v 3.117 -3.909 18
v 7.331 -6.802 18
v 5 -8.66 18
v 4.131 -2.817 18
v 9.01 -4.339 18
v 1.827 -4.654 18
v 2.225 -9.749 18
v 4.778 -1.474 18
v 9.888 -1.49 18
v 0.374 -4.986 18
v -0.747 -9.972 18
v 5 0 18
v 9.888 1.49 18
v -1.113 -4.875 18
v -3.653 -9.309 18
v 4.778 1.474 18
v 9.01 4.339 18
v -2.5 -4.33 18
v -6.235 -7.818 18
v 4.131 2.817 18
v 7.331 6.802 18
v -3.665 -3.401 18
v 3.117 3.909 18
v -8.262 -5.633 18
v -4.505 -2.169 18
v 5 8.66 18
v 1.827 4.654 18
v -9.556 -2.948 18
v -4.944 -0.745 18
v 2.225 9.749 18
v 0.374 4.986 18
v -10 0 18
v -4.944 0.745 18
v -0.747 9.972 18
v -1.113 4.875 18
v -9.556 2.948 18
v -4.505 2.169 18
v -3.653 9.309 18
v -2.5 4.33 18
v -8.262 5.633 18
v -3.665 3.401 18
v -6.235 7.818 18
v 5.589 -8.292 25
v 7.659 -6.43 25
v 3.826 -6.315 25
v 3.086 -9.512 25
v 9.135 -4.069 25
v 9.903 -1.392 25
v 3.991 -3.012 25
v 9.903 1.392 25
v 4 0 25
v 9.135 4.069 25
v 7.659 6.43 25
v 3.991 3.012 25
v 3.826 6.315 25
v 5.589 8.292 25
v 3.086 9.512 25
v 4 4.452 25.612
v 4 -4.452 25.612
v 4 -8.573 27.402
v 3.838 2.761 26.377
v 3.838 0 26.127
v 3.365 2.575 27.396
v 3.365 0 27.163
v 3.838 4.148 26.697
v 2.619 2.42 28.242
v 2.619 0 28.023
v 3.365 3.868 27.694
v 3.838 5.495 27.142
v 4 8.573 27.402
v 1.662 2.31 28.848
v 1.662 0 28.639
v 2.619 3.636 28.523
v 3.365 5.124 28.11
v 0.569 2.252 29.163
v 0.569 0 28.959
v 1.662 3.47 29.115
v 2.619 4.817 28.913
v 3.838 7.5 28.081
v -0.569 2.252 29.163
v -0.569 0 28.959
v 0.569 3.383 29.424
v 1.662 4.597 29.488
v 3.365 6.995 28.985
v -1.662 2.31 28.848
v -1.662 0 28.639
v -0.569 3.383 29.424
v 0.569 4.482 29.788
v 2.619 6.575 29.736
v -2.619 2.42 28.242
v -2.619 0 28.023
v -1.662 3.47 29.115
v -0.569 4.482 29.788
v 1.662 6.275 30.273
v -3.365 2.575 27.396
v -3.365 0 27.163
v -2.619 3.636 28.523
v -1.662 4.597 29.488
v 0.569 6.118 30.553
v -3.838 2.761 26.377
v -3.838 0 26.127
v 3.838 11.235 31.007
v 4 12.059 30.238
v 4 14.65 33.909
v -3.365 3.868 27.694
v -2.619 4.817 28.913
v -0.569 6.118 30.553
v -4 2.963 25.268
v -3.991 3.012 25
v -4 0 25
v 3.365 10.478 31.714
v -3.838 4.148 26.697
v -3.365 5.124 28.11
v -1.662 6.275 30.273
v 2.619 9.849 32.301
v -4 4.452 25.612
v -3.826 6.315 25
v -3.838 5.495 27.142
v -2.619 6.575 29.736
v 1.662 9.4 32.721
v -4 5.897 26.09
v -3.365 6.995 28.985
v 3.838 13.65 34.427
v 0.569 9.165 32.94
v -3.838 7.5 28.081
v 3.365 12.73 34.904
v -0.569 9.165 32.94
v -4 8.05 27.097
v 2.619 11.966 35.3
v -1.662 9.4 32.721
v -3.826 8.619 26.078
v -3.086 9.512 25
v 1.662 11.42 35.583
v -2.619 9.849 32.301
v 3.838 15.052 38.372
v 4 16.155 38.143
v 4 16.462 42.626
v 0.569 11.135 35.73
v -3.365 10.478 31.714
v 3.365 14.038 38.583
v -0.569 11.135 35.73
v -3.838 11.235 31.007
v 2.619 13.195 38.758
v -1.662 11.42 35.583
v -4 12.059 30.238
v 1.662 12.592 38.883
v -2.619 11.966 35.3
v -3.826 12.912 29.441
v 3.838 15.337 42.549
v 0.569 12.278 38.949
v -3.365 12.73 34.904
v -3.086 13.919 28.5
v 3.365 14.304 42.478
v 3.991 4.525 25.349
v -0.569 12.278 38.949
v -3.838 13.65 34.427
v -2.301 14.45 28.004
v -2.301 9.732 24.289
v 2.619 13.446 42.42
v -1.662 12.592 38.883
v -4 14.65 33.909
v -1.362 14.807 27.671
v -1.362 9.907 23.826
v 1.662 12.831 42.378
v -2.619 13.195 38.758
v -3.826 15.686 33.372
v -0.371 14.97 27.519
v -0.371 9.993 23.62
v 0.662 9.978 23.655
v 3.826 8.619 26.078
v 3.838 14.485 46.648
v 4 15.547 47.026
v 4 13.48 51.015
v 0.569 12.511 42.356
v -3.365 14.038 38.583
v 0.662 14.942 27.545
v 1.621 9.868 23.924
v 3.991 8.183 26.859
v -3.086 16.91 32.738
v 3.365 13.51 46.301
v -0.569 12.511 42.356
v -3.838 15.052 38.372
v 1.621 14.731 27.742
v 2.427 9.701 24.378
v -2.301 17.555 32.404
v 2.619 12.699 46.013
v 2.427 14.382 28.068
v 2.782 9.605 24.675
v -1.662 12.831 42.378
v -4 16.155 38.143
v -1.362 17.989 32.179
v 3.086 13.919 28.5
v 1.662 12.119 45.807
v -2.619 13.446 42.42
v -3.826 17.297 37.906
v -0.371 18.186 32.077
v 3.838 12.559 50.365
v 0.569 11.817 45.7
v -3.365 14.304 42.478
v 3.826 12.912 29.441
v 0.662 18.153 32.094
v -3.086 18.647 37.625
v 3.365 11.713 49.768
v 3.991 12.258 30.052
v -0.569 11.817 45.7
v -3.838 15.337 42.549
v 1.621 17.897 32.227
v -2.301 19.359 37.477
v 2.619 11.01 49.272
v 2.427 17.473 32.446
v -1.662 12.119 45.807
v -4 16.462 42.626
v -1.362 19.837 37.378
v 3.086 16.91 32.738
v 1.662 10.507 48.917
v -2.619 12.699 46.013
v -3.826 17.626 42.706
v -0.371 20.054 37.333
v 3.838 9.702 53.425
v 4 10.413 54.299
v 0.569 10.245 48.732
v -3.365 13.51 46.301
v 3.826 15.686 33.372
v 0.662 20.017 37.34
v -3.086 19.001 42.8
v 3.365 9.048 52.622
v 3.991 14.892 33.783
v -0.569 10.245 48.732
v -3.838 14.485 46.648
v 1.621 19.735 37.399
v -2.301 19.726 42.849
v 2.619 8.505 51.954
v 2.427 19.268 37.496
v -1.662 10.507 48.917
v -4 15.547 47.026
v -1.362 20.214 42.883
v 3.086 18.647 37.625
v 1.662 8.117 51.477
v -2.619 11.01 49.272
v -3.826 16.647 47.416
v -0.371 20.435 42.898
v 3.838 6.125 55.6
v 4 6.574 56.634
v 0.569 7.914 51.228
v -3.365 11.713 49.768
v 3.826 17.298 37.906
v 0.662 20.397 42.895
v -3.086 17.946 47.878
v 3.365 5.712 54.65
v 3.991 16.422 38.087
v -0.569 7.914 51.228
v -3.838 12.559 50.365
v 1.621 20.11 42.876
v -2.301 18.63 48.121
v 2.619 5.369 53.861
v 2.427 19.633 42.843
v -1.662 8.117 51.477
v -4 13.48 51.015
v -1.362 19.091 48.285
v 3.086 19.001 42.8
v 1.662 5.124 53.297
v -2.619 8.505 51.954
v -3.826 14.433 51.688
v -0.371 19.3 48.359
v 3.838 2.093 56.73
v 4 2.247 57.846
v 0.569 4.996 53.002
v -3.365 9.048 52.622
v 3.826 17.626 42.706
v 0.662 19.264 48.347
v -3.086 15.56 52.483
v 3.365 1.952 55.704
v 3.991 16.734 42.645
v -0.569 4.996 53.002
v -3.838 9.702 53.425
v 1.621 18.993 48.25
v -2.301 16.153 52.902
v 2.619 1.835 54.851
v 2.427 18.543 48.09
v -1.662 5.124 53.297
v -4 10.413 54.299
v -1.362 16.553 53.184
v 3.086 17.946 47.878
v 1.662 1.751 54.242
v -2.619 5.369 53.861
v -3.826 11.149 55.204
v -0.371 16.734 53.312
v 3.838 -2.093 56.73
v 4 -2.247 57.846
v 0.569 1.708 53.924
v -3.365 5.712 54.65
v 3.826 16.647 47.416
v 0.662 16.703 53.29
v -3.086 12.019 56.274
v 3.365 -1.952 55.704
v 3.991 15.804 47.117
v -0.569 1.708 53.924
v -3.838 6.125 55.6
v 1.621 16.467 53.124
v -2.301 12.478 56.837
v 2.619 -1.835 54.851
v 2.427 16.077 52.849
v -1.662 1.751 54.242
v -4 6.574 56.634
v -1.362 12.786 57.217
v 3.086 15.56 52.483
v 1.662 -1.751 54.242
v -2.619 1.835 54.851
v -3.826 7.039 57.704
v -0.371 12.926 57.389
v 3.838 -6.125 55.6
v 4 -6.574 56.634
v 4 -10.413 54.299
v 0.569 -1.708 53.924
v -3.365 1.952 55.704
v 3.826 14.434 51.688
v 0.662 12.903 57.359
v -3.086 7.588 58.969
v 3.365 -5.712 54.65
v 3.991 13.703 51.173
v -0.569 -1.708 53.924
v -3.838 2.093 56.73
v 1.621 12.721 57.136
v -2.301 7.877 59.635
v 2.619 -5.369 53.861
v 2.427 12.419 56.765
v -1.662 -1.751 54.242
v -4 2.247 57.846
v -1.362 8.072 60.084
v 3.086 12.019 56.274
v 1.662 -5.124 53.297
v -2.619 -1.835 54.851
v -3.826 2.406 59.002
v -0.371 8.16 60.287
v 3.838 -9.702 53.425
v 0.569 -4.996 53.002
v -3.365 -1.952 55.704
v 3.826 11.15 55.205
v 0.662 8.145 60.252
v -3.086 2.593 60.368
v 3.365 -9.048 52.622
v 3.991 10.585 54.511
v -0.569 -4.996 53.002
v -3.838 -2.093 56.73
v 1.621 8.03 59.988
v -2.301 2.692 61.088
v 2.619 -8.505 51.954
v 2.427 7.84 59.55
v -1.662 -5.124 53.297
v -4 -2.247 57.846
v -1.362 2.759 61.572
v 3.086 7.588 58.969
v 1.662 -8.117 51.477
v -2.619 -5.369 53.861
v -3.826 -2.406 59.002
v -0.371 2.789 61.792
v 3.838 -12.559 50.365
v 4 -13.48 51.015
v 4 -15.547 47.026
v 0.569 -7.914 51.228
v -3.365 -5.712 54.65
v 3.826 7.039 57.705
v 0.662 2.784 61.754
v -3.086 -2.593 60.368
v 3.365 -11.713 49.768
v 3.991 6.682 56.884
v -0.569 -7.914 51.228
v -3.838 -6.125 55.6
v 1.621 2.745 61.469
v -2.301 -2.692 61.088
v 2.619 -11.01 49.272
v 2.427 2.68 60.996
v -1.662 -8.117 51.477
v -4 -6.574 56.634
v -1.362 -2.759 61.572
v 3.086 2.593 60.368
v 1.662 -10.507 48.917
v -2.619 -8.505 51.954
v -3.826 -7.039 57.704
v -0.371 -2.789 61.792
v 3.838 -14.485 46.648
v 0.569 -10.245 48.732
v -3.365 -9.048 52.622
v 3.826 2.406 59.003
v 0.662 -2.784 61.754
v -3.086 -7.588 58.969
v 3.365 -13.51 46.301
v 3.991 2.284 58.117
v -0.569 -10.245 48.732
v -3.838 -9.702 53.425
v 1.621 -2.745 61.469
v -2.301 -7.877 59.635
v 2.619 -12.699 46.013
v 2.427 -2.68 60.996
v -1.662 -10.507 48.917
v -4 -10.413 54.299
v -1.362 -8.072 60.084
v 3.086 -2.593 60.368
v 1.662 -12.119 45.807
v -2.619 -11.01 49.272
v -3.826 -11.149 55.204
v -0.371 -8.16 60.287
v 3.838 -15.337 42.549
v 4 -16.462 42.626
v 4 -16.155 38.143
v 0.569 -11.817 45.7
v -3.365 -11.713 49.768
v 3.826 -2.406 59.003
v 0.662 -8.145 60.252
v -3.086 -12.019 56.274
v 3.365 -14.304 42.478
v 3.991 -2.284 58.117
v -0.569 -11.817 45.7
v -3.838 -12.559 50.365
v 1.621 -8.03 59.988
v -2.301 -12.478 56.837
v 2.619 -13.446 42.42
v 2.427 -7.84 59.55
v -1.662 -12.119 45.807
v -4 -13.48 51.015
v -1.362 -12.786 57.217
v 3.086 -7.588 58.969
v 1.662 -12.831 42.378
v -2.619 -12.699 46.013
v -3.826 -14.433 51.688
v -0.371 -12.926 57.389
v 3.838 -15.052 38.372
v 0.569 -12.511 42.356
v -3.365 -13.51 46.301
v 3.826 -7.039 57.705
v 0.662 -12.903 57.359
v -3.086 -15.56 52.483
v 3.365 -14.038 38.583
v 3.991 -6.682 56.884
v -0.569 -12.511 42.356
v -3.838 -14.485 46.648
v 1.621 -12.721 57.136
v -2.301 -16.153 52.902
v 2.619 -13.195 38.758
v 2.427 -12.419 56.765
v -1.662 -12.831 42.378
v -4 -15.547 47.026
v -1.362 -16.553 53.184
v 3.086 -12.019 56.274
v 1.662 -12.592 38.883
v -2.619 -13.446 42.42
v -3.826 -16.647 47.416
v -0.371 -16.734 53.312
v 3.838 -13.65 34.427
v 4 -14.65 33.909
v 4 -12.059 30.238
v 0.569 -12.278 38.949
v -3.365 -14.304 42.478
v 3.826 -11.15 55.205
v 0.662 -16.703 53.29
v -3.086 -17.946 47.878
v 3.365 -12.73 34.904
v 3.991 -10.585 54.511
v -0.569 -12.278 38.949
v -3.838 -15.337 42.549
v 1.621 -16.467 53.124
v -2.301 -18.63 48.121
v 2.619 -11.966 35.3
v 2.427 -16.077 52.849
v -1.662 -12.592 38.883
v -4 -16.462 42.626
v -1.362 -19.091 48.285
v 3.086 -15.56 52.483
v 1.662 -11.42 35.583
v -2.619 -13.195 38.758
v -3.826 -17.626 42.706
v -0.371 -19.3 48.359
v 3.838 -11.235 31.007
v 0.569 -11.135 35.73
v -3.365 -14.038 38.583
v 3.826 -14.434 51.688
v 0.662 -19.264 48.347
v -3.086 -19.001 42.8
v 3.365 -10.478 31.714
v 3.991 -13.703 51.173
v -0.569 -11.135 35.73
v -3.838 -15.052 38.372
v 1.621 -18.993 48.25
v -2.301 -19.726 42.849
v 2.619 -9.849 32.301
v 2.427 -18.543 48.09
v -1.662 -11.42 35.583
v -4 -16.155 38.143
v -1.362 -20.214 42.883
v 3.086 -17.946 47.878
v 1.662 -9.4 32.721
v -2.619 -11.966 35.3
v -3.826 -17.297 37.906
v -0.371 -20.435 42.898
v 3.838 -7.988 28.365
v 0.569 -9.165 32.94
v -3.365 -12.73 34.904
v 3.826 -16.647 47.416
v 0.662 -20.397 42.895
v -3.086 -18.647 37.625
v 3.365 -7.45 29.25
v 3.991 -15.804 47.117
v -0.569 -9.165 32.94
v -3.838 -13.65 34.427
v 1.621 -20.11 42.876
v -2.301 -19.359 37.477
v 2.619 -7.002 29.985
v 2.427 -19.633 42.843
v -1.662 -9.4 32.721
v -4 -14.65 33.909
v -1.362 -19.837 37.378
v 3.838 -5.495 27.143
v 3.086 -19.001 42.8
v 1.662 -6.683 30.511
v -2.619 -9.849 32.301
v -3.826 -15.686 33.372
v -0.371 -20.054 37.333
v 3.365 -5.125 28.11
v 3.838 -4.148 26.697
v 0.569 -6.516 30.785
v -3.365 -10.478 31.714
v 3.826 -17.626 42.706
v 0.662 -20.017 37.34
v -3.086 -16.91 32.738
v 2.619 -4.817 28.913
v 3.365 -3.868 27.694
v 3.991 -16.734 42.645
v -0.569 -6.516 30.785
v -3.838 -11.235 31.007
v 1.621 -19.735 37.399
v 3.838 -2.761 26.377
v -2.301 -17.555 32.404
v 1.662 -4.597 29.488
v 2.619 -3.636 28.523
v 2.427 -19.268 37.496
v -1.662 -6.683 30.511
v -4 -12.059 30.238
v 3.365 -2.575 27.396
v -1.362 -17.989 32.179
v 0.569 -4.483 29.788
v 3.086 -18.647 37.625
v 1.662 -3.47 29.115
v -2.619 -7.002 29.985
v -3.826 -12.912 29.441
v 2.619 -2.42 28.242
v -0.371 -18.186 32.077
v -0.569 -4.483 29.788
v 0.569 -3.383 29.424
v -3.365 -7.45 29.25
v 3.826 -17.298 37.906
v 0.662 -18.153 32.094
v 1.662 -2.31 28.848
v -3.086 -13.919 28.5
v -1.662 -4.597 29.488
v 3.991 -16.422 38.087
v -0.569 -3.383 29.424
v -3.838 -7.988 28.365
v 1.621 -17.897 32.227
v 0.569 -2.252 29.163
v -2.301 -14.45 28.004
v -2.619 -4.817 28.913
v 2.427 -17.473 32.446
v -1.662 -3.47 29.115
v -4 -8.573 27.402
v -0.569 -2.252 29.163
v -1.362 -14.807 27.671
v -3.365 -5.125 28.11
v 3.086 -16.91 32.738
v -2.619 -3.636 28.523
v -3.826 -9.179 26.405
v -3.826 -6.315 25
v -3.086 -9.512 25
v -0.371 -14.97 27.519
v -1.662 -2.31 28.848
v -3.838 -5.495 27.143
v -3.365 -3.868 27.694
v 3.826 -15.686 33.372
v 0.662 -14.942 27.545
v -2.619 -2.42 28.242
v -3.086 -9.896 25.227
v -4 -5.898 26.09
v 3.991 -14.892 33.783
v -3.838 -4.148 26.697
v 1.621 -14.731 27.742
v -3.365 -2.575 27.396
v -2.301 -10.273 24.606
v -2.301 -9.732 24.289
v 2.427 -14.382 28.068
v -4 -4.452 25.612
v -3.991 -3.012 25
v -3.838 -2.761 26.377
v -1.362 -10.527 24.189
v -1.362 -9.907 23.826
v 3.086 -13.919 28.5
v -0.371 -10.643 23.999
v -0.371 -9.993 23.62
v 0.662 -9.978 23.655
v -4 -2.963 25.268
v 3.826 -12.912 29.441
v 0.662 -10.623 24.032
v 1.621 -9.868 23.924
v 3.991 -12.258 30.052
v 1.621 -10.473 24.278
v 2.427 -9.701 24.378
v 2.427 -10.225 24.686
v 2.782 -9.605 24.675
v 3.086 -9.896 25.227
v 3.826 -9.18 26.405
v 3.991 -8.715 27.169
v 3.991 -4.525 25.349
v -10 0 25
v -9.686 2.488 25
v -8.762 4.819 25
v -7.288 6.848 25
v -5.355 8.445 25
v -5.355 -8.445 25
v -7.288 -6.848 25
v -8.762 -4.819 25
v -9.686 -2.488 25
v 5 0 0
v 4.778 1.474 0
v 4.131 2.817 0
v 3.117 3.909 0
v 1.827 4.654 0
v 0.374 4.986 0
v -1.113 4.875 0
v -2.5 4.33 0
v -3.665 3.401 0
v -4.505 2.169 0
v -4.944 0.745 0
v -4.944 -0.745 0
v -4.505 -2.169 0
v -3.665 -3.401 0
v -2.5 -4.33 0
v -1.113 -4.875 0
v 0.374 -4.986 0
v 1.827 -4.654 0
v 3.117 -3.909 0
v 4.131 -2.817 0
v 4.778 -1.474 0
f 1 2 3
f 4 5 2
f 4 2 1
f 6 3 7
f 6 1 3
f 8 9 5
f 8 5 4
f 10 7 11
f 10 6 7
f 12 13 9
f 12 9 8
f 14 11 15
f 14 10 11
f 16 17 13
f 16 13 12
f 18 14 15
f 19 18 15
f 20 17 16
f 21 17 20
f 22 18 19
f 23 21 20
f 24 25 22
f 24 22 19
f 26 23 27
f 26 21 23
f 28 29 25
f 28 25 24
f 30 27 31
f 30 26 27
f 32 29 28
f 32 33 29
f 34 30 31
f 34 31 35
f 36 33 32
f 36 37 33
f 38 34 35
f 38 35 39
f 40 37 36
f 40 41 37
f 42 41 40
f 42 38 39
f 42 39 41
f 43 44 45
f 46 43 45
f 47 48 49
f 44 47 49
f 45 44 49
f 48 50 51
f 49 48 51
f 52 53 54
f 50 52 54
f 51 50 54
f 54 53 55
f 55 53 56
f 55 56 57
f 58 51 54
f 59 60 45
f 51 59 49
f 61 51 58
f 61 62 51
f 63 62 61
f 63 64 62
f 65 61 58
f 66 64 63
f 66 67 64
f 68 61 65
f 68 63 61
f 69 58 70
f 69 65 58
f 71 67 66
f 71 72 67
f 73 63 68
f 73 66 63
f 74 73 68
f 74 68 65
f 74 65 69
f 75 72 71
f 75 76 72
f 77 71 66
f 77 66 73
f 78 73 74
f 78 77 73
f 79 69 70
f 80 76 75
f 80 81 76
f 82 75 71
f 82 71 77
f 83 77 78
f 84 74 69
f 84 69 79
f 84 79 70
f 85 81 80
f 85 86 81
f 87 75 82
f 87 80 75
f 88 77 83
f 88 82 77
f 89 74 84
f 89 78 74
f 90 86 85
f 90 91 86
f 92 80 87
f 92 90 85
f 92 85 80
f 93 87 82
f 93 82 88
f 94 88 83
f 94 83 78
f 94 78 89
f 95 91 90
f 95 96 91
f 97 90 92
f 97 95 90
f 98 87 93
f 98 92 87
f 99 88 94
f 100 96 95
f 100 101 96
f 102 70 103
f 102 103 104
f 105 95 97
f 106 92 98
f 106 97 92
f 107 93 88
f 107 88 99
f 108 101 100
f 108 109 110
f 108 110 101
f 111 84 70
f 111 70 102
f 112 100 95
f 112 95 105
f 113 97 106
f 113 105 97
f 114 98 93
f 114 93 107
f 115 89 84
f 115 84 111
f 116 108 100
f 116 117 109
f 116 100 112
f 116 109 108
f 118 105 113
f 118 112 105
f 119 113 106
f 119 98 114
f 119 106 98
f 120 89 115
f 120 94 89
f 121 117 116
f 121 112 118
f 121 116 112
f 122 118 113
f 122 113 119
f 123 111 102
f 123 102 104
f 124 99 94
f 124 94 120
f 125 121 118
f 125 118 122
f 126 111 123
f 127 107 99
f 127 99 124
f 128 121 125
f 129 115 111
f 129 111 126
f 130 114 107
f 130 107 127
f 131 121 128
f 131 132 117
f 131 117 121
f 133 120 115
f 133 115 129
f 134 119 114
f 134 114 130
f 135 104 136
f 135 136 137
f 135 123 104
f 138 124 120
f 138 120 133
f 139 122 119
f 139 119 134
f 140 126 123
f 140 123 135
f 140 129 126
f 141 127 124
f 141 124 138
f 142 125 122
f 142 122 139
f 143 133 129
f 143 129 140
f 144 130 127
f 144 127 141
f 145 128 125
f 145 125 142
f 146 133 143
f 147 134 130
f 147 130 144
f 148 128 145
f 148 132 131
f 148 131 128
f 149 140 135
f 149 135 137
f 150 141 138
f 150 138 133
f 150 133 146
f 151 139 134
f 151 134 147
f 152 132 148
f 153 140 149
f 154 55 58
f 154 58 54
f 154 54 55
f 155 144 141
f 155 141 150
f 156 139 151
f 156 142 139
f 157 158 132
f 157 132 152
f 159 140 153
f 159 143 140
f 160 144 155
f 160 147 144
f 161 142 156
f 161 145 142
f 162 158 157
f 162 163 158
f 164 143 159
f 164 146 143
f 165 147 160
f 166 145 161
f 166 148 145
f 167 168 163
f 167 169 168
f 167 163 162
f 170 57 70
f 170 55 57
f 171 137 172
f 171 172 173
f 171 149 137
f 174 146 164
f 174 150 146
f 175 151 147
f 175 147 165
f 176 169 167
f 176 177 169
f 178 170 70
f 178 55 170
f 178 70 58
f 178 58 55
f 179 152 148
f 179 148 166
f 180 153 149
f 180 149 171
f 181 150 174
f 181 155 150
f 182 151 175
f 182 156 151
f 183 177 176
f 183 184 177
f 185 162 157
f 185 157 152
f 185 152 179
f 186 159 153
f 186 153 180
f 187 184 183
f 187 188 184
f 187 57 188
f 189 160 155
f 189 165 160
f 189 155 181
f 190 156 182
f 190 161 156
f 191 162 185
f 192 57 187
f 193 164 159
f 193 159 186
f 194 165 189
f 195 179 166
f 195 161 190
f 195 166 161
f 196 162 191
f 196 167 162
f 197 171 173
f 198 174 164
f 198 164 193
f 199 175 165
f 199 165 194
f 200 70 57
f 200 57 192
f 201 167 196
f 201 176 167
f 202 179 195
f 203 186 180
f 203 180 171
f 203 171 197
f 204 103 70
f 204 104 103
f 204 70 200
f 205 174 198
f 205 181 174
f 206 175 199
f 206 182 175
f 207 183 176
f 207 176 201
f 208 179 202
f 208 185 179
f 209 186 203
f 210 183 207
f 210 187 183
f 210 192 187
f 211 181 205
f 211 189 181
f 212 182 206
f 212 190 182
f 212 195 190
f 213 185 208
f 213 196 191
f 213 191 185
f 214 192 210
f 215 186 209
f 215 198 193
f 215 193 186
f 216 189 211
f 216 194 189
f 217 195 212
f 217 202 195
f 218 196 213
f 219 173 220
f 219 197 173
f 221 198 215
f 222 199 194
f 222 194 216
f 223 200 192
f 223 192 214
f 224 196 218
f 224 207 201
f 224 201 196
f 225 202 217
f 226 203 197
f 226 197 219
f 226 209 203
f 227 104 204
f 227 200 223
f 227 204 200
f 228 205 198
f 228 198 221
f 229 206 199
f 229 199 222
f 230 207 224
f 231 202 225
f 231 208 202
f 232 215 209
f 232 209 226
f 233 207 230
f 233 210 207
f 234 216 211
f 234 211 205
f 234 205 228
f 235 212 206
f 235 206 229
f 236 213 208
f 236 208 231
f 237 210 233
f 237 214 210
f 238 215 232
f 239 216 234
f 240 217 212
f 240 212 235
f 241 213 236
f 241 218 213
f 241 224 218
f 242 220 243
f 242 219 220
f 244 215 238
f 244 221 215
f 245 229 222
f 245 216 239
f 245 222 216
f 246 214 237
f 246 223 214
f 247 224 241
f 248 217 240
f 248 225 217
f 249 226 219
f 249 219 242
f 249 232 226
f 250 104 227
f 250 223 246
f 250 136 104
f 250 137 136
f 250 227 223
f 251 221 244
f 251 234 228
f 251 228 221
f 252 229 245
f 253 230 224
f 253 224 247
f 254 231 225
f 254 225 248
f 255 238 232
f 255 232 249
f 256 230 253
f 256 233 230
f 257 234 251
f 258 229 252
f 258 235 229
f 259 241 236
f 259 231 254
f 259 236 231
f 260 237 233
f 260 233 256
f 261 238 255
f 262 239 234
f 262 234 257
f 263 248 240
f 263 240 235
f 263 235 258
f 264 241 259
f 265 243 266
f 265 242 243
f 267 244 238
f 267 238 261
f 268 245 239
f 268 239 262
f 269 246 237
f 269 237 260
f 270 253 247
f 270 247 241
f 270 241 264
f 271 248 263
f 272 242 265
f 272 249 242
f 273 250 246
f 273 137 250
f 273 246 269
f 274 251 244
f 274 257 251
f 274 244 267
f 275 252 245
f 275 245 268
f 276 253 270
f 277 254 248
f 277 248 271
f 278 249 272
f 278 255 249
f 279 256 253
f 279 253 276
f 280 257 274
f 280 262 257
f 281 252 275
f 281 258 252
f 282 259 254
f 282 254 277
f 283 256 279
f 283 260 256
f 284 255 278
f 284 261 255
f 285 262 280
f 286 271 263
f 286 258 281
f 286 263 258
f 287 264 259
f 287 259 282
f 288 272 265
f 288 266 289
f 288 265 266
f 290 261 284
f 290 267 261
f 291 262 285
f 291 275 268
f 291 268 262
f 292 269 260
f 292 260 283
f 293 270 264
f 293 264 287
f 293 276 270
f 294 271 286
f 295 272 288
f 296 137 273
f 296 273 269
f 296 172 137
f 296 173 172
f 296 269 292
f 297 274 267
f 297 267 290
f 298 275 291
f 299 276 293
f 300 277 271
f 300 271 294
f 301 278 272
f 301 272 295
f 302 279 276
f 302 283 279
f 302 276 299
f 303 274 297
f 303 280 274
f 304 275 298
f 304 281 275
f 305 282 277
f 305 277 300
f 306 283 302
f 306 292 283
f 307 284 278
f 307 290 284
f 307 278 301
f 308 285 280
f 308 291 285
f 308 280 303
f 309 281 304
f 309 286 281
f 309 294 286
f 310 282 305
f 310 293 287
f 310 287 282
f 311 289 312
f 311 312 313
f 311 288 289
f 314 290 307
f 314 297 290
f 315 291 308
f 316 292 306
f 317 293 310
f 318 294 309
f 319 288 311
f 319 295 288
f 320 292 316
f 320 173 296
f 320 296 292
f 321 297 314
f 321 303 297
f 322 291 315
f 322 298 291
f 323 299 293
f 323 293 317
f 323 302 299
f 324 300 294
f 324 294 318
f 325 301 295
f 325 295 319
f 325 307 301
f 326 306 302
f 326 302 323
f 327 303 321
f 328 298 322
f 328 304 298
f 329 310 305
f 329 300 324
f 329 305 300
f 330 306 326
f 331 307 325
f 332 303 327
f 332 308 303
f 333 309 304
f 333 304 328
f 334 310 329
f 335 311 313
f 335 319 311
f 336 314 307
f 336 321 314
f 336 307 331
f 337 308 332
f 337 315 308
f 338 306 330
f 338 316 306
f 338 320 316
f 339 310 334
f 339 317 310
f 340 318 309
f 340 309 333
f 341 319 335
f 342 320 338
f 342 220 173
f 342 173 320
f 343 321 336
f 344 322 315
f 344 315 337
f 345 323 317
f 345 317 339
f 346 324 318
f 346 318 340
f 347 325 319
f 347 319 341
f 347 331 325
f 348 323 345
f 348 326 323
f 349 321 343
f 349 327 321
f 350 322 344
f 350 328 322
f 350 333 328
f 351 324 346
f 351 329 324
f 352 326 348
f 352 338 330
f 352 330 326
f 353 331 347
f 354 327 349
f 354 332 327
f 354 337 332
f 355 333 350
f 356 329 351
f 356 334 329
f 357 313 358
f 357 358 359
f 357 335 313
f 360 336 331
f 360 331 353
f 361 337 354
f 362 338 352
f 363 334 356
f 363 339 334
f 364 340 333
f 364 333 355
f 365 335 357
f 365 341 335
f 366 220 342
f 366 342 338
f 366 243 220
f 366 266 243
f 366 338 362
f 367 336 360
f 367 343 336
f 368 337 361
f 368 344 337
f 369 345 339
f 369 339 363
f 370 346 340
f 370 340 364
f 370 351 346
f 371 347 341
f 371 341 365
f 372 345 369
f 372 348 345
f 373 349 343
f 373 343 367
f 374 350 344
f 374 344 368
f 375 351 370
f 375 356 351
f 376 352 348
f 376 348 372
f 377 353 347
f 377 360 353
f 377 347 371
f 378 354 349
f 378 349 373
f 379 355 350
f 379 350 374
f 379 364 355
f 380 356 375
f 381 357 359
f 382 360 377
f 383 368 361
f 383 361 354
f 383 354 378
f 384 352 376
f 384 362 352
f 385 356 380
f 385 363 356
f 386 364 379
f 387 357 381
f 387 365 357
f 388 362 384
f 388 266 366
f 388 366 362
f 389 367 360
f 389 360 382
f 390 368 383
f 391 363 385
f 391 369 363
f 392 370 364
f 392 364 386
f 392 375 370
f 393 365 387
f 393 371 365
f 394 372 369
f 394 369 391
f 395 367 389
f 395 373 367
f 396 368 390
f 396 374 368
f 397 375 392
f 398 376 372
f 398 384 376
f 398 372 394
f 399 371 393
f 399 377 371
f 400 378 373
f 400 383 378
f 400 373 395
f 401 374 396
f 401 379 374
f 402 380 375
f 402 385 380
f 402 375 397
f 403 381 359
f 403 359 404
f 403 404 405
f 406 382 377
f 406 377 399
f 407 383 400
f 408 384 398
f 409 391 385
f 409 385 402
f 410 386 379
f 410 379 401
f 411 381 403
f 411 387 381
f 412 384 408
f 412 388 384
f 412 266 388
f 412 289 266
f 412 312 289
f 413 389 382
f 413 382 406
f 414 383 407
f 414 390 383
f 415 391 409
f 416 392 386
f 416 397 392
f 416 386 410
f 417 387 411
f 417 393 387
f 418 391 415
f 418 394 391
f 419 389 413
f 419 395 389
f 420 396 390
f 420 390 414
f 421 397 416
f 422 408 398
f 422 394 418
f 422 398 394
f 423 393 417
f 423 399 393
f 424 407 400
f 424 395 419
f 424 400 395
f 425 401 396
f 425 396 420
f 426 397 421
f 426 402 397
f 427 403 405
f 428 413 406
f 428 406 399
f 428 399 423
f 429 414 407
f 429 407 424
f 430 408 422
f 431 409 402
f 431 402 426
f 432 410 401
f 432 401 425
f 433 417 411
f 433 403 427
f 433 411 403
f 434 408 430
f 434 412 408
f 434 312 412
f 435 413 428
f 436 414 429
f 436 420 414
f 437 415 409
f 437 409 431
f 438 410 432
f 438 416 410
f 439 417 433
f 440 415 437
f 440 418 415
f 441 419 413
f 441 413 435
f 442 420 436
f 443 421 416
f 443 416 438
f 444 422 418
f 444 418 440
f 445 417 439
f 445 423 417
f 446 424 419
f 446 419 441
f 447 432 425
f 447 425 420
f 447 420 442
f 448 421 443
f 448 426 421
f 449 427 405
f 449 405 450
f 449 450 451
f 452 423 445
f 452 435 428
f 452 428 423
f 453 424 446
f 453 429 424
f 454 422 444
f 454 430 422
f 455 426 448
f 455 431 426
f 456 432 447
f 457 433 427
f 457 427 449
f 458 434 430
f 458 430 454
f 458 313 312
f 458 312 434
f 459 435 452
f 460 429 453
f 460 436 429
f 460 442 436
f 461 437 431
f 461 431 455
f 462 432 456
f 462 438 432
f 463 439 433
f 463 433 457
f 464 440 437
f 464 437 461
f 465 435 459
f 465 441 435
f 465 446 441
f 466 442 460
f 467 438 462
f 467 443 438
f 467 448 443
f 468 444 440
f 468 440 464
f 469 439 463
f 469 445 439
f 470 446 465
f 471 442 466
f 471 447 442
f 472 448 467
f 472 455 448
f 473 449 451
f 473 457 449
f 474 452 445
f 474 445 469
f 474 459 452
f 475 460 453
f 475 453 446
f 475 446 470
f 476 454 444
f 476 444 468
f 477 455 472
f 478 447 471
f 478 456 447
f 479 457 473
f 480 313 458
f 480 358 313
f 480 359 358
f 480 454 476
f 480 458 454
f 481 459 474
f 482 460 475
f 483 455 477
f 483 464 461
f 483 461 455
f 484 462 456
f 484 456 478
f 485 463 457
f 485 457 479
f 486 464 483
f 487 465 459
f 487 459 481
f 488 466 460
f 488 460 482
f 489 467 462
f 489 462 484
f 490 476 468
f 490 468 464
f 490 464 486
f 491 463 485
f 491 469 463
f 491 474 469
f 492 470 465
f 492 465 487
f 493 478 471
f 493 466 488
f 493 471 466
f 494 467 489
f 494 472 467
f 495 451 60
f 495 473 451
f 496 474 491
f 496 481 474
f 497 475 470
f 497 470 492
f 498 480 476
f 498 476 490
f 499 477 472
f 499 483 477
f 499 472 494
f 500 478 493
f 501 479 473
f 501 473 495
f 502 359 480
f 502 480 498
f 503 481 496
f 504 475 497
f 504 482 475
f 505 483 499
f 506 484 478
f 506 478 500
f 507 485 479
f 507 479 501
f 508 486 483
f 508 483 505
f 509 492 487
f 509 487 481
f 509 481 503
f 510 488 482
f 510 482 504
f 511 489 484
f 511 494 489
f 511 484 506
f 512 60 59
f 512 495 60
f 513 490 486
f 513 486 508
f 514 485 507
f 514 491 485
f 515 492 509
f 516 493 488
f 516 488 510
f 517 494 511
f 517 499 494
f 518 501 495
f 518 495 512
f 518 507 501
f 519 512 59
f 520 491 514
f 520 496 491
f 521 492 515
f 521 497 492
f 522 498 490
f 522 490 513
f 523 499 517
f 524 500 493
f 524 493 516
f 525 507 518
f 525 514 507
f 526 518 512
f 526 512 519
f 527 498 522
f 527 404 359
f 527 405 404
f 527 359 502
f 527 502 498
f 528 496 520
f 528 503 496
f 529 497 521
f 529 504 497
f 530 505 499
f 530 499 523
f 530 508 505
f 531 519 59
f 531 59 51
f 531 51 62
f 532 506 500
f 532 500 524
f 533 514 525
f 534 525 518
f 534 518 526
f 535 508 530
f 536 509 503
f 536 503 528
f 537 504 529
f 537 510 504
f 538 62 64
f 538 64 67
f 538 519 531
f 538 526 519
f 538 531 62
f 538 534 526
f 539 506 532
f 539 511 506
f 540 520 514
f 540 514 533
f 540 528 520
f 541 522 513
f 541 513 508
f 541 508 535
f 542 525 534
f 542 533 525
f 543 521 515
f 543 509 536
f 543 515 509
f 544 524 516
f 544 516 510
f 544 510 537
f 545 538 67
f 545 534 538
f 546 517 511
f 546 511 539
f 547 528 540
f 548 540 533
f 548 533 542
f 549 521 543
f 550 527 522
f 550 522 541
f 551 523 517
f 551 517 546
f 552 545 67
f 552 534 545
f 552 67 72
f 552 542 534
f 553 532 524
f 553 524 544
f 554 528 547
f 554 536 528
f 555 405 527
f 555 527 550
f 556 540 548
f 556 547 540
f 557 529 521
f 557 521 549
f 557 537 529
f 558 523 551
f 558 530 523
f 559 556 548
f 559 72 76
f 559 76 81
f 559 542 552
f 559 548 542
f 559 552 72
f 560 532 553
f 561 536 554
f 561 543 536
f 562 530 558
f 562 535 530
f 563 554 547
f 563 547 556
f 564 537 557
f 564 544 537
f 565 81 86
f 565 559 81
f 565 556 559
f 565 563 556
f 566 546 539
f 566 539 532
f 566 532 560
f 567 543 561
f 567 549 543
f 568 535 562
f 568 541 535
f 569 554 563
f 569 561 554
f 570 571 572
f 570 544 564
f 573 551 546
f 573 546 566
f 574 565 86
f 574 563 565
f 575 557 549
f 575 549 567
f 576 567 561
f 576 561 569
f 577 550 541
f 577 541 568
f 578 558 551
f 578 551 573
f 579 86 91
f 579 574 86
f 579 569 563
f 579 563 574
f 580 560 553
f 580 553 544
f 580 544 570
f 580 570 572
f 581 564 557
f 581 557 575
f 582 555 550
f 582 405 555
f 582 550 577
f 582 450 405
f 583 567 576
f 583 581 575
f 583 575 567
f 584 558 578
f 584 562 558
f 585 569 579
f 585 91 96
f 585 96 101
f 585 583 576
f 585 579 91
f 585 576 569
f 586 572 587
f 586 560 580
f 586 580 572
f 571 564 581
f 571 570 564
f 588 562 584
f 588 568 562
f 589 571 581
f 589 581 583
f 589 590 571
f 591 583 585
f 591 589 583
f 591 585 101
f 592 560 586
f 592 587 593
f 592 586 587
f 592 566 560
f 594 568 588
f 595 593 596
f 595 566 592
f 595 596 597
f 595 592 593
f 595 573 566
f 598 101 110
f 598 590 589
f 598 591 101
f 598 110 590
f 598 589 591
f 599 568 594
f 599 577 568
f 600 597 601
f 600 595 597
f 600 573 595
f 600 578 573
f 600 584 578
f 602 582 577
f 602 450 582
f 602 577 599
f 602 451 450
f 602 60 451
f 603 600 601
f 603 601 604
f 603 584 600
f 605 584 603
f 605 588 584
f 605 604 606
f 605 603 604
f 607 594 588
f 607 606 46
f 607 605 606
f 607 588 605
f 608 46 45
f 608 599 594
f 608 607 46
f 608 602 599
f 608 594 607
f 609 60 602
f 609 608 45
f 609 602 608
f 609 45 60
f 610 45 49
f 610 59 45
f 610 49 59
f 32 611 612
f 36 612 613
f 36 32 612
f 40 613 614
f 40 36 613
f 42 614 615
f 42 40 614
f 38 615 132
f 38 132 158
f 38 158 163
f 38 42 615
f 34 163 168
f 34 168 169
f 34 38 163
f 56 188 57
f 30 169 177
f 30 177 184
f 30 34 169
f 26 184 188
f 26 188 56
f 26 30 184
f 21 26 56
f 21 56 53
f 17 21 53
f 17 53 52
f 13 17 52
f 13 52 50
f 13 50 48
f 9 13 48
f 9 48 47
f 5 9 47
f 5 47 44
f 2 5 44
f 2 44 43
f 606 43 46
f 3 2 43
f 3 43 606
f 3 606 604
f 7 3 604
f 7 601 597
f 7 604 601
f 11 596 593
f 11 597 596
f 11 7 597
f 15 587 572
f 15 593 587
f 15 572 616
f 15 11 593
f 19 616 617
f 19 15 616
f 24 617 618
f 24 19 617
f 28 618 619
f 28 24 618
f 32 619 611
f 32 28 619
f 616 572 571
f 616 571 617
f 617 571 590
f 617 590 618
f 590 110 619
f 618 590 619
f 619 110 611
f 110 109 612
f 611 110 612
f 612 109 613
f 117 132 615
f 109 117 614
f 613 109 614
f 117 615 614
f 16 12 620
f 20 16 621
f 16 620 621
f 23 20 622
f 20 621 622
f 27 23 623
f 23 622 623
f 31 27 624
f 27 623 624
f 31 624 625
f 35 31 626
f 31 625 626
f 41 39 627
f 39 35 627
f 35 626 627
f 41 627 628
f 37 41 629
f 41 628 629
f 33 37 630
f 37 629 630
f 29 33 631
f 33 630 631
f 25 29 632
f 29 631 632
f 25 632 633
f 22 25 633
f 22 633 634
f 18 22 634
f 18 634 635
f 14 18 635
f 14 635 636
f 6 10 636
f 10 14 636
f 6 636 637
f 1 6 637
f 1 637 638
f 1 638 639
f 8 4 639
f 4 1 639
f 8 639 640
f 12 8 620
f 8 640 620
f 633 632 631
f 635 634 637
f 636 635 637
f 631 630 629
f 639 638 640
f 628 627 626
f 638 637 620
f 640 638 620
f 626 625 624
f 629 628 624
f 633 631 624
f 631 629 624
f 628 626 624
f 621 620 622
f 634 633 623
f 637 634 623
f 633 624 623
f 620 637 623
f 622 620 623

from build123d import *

# Parameters (mm, degrees)
SKETCH_1_R      = 5
EXTRUDE_1_DEPTH = 25
SKETCH_2_R      = 4
SKETCH_4_R      = 10
EXTRUDE_2_DEPTH = 7


with BuildPart() as part:
    # ｽｹｯﾁ1 → ﾎﾞｽ - 押し出し1 (new body)
    with BuildSketch(Plane.XY):
        Circle(SKETCH_1_R)
    extrude(amount=EXTRUDE_1_DEPTH)

    # ｽｲｰﾌﾟ1: sweep along a path in ｽｹｯﾁ3
    with BuildLine(Plane(origin=(0, 0, 0), x_dir=(0, 0, -1), z_dir=(1, 0, 0))) as sweep_1_path:
        CenterArc((-41.5, 0), 16.5, 0, 360)
    # ｽｹｯﾁ2 → ｽｲｰﾌﾟ1 (sweep)
    with BuildSketch(Plane(origin=(0, 0, 0), x_dir=(1, 0, 0), z_dir=(0, 1, 0))):
        with Locations((0, -25)):
            Circle(SKETCH_2_R)
    sweep(path=sweep_1_path.line)

    # ｽｹｯﾁ4 → ﾎﾞｽ - 押し出し2 (add)
    with BuildSketch(Plane(origin=(0, 0, 18), x_dir=(-1, 0, 0), z_dir=(0, 0, -1))):
        Circle(SKETCH_4_R)
    extrude(amount=-EXTRUDE_2_DEPTH)


solid = part.part
